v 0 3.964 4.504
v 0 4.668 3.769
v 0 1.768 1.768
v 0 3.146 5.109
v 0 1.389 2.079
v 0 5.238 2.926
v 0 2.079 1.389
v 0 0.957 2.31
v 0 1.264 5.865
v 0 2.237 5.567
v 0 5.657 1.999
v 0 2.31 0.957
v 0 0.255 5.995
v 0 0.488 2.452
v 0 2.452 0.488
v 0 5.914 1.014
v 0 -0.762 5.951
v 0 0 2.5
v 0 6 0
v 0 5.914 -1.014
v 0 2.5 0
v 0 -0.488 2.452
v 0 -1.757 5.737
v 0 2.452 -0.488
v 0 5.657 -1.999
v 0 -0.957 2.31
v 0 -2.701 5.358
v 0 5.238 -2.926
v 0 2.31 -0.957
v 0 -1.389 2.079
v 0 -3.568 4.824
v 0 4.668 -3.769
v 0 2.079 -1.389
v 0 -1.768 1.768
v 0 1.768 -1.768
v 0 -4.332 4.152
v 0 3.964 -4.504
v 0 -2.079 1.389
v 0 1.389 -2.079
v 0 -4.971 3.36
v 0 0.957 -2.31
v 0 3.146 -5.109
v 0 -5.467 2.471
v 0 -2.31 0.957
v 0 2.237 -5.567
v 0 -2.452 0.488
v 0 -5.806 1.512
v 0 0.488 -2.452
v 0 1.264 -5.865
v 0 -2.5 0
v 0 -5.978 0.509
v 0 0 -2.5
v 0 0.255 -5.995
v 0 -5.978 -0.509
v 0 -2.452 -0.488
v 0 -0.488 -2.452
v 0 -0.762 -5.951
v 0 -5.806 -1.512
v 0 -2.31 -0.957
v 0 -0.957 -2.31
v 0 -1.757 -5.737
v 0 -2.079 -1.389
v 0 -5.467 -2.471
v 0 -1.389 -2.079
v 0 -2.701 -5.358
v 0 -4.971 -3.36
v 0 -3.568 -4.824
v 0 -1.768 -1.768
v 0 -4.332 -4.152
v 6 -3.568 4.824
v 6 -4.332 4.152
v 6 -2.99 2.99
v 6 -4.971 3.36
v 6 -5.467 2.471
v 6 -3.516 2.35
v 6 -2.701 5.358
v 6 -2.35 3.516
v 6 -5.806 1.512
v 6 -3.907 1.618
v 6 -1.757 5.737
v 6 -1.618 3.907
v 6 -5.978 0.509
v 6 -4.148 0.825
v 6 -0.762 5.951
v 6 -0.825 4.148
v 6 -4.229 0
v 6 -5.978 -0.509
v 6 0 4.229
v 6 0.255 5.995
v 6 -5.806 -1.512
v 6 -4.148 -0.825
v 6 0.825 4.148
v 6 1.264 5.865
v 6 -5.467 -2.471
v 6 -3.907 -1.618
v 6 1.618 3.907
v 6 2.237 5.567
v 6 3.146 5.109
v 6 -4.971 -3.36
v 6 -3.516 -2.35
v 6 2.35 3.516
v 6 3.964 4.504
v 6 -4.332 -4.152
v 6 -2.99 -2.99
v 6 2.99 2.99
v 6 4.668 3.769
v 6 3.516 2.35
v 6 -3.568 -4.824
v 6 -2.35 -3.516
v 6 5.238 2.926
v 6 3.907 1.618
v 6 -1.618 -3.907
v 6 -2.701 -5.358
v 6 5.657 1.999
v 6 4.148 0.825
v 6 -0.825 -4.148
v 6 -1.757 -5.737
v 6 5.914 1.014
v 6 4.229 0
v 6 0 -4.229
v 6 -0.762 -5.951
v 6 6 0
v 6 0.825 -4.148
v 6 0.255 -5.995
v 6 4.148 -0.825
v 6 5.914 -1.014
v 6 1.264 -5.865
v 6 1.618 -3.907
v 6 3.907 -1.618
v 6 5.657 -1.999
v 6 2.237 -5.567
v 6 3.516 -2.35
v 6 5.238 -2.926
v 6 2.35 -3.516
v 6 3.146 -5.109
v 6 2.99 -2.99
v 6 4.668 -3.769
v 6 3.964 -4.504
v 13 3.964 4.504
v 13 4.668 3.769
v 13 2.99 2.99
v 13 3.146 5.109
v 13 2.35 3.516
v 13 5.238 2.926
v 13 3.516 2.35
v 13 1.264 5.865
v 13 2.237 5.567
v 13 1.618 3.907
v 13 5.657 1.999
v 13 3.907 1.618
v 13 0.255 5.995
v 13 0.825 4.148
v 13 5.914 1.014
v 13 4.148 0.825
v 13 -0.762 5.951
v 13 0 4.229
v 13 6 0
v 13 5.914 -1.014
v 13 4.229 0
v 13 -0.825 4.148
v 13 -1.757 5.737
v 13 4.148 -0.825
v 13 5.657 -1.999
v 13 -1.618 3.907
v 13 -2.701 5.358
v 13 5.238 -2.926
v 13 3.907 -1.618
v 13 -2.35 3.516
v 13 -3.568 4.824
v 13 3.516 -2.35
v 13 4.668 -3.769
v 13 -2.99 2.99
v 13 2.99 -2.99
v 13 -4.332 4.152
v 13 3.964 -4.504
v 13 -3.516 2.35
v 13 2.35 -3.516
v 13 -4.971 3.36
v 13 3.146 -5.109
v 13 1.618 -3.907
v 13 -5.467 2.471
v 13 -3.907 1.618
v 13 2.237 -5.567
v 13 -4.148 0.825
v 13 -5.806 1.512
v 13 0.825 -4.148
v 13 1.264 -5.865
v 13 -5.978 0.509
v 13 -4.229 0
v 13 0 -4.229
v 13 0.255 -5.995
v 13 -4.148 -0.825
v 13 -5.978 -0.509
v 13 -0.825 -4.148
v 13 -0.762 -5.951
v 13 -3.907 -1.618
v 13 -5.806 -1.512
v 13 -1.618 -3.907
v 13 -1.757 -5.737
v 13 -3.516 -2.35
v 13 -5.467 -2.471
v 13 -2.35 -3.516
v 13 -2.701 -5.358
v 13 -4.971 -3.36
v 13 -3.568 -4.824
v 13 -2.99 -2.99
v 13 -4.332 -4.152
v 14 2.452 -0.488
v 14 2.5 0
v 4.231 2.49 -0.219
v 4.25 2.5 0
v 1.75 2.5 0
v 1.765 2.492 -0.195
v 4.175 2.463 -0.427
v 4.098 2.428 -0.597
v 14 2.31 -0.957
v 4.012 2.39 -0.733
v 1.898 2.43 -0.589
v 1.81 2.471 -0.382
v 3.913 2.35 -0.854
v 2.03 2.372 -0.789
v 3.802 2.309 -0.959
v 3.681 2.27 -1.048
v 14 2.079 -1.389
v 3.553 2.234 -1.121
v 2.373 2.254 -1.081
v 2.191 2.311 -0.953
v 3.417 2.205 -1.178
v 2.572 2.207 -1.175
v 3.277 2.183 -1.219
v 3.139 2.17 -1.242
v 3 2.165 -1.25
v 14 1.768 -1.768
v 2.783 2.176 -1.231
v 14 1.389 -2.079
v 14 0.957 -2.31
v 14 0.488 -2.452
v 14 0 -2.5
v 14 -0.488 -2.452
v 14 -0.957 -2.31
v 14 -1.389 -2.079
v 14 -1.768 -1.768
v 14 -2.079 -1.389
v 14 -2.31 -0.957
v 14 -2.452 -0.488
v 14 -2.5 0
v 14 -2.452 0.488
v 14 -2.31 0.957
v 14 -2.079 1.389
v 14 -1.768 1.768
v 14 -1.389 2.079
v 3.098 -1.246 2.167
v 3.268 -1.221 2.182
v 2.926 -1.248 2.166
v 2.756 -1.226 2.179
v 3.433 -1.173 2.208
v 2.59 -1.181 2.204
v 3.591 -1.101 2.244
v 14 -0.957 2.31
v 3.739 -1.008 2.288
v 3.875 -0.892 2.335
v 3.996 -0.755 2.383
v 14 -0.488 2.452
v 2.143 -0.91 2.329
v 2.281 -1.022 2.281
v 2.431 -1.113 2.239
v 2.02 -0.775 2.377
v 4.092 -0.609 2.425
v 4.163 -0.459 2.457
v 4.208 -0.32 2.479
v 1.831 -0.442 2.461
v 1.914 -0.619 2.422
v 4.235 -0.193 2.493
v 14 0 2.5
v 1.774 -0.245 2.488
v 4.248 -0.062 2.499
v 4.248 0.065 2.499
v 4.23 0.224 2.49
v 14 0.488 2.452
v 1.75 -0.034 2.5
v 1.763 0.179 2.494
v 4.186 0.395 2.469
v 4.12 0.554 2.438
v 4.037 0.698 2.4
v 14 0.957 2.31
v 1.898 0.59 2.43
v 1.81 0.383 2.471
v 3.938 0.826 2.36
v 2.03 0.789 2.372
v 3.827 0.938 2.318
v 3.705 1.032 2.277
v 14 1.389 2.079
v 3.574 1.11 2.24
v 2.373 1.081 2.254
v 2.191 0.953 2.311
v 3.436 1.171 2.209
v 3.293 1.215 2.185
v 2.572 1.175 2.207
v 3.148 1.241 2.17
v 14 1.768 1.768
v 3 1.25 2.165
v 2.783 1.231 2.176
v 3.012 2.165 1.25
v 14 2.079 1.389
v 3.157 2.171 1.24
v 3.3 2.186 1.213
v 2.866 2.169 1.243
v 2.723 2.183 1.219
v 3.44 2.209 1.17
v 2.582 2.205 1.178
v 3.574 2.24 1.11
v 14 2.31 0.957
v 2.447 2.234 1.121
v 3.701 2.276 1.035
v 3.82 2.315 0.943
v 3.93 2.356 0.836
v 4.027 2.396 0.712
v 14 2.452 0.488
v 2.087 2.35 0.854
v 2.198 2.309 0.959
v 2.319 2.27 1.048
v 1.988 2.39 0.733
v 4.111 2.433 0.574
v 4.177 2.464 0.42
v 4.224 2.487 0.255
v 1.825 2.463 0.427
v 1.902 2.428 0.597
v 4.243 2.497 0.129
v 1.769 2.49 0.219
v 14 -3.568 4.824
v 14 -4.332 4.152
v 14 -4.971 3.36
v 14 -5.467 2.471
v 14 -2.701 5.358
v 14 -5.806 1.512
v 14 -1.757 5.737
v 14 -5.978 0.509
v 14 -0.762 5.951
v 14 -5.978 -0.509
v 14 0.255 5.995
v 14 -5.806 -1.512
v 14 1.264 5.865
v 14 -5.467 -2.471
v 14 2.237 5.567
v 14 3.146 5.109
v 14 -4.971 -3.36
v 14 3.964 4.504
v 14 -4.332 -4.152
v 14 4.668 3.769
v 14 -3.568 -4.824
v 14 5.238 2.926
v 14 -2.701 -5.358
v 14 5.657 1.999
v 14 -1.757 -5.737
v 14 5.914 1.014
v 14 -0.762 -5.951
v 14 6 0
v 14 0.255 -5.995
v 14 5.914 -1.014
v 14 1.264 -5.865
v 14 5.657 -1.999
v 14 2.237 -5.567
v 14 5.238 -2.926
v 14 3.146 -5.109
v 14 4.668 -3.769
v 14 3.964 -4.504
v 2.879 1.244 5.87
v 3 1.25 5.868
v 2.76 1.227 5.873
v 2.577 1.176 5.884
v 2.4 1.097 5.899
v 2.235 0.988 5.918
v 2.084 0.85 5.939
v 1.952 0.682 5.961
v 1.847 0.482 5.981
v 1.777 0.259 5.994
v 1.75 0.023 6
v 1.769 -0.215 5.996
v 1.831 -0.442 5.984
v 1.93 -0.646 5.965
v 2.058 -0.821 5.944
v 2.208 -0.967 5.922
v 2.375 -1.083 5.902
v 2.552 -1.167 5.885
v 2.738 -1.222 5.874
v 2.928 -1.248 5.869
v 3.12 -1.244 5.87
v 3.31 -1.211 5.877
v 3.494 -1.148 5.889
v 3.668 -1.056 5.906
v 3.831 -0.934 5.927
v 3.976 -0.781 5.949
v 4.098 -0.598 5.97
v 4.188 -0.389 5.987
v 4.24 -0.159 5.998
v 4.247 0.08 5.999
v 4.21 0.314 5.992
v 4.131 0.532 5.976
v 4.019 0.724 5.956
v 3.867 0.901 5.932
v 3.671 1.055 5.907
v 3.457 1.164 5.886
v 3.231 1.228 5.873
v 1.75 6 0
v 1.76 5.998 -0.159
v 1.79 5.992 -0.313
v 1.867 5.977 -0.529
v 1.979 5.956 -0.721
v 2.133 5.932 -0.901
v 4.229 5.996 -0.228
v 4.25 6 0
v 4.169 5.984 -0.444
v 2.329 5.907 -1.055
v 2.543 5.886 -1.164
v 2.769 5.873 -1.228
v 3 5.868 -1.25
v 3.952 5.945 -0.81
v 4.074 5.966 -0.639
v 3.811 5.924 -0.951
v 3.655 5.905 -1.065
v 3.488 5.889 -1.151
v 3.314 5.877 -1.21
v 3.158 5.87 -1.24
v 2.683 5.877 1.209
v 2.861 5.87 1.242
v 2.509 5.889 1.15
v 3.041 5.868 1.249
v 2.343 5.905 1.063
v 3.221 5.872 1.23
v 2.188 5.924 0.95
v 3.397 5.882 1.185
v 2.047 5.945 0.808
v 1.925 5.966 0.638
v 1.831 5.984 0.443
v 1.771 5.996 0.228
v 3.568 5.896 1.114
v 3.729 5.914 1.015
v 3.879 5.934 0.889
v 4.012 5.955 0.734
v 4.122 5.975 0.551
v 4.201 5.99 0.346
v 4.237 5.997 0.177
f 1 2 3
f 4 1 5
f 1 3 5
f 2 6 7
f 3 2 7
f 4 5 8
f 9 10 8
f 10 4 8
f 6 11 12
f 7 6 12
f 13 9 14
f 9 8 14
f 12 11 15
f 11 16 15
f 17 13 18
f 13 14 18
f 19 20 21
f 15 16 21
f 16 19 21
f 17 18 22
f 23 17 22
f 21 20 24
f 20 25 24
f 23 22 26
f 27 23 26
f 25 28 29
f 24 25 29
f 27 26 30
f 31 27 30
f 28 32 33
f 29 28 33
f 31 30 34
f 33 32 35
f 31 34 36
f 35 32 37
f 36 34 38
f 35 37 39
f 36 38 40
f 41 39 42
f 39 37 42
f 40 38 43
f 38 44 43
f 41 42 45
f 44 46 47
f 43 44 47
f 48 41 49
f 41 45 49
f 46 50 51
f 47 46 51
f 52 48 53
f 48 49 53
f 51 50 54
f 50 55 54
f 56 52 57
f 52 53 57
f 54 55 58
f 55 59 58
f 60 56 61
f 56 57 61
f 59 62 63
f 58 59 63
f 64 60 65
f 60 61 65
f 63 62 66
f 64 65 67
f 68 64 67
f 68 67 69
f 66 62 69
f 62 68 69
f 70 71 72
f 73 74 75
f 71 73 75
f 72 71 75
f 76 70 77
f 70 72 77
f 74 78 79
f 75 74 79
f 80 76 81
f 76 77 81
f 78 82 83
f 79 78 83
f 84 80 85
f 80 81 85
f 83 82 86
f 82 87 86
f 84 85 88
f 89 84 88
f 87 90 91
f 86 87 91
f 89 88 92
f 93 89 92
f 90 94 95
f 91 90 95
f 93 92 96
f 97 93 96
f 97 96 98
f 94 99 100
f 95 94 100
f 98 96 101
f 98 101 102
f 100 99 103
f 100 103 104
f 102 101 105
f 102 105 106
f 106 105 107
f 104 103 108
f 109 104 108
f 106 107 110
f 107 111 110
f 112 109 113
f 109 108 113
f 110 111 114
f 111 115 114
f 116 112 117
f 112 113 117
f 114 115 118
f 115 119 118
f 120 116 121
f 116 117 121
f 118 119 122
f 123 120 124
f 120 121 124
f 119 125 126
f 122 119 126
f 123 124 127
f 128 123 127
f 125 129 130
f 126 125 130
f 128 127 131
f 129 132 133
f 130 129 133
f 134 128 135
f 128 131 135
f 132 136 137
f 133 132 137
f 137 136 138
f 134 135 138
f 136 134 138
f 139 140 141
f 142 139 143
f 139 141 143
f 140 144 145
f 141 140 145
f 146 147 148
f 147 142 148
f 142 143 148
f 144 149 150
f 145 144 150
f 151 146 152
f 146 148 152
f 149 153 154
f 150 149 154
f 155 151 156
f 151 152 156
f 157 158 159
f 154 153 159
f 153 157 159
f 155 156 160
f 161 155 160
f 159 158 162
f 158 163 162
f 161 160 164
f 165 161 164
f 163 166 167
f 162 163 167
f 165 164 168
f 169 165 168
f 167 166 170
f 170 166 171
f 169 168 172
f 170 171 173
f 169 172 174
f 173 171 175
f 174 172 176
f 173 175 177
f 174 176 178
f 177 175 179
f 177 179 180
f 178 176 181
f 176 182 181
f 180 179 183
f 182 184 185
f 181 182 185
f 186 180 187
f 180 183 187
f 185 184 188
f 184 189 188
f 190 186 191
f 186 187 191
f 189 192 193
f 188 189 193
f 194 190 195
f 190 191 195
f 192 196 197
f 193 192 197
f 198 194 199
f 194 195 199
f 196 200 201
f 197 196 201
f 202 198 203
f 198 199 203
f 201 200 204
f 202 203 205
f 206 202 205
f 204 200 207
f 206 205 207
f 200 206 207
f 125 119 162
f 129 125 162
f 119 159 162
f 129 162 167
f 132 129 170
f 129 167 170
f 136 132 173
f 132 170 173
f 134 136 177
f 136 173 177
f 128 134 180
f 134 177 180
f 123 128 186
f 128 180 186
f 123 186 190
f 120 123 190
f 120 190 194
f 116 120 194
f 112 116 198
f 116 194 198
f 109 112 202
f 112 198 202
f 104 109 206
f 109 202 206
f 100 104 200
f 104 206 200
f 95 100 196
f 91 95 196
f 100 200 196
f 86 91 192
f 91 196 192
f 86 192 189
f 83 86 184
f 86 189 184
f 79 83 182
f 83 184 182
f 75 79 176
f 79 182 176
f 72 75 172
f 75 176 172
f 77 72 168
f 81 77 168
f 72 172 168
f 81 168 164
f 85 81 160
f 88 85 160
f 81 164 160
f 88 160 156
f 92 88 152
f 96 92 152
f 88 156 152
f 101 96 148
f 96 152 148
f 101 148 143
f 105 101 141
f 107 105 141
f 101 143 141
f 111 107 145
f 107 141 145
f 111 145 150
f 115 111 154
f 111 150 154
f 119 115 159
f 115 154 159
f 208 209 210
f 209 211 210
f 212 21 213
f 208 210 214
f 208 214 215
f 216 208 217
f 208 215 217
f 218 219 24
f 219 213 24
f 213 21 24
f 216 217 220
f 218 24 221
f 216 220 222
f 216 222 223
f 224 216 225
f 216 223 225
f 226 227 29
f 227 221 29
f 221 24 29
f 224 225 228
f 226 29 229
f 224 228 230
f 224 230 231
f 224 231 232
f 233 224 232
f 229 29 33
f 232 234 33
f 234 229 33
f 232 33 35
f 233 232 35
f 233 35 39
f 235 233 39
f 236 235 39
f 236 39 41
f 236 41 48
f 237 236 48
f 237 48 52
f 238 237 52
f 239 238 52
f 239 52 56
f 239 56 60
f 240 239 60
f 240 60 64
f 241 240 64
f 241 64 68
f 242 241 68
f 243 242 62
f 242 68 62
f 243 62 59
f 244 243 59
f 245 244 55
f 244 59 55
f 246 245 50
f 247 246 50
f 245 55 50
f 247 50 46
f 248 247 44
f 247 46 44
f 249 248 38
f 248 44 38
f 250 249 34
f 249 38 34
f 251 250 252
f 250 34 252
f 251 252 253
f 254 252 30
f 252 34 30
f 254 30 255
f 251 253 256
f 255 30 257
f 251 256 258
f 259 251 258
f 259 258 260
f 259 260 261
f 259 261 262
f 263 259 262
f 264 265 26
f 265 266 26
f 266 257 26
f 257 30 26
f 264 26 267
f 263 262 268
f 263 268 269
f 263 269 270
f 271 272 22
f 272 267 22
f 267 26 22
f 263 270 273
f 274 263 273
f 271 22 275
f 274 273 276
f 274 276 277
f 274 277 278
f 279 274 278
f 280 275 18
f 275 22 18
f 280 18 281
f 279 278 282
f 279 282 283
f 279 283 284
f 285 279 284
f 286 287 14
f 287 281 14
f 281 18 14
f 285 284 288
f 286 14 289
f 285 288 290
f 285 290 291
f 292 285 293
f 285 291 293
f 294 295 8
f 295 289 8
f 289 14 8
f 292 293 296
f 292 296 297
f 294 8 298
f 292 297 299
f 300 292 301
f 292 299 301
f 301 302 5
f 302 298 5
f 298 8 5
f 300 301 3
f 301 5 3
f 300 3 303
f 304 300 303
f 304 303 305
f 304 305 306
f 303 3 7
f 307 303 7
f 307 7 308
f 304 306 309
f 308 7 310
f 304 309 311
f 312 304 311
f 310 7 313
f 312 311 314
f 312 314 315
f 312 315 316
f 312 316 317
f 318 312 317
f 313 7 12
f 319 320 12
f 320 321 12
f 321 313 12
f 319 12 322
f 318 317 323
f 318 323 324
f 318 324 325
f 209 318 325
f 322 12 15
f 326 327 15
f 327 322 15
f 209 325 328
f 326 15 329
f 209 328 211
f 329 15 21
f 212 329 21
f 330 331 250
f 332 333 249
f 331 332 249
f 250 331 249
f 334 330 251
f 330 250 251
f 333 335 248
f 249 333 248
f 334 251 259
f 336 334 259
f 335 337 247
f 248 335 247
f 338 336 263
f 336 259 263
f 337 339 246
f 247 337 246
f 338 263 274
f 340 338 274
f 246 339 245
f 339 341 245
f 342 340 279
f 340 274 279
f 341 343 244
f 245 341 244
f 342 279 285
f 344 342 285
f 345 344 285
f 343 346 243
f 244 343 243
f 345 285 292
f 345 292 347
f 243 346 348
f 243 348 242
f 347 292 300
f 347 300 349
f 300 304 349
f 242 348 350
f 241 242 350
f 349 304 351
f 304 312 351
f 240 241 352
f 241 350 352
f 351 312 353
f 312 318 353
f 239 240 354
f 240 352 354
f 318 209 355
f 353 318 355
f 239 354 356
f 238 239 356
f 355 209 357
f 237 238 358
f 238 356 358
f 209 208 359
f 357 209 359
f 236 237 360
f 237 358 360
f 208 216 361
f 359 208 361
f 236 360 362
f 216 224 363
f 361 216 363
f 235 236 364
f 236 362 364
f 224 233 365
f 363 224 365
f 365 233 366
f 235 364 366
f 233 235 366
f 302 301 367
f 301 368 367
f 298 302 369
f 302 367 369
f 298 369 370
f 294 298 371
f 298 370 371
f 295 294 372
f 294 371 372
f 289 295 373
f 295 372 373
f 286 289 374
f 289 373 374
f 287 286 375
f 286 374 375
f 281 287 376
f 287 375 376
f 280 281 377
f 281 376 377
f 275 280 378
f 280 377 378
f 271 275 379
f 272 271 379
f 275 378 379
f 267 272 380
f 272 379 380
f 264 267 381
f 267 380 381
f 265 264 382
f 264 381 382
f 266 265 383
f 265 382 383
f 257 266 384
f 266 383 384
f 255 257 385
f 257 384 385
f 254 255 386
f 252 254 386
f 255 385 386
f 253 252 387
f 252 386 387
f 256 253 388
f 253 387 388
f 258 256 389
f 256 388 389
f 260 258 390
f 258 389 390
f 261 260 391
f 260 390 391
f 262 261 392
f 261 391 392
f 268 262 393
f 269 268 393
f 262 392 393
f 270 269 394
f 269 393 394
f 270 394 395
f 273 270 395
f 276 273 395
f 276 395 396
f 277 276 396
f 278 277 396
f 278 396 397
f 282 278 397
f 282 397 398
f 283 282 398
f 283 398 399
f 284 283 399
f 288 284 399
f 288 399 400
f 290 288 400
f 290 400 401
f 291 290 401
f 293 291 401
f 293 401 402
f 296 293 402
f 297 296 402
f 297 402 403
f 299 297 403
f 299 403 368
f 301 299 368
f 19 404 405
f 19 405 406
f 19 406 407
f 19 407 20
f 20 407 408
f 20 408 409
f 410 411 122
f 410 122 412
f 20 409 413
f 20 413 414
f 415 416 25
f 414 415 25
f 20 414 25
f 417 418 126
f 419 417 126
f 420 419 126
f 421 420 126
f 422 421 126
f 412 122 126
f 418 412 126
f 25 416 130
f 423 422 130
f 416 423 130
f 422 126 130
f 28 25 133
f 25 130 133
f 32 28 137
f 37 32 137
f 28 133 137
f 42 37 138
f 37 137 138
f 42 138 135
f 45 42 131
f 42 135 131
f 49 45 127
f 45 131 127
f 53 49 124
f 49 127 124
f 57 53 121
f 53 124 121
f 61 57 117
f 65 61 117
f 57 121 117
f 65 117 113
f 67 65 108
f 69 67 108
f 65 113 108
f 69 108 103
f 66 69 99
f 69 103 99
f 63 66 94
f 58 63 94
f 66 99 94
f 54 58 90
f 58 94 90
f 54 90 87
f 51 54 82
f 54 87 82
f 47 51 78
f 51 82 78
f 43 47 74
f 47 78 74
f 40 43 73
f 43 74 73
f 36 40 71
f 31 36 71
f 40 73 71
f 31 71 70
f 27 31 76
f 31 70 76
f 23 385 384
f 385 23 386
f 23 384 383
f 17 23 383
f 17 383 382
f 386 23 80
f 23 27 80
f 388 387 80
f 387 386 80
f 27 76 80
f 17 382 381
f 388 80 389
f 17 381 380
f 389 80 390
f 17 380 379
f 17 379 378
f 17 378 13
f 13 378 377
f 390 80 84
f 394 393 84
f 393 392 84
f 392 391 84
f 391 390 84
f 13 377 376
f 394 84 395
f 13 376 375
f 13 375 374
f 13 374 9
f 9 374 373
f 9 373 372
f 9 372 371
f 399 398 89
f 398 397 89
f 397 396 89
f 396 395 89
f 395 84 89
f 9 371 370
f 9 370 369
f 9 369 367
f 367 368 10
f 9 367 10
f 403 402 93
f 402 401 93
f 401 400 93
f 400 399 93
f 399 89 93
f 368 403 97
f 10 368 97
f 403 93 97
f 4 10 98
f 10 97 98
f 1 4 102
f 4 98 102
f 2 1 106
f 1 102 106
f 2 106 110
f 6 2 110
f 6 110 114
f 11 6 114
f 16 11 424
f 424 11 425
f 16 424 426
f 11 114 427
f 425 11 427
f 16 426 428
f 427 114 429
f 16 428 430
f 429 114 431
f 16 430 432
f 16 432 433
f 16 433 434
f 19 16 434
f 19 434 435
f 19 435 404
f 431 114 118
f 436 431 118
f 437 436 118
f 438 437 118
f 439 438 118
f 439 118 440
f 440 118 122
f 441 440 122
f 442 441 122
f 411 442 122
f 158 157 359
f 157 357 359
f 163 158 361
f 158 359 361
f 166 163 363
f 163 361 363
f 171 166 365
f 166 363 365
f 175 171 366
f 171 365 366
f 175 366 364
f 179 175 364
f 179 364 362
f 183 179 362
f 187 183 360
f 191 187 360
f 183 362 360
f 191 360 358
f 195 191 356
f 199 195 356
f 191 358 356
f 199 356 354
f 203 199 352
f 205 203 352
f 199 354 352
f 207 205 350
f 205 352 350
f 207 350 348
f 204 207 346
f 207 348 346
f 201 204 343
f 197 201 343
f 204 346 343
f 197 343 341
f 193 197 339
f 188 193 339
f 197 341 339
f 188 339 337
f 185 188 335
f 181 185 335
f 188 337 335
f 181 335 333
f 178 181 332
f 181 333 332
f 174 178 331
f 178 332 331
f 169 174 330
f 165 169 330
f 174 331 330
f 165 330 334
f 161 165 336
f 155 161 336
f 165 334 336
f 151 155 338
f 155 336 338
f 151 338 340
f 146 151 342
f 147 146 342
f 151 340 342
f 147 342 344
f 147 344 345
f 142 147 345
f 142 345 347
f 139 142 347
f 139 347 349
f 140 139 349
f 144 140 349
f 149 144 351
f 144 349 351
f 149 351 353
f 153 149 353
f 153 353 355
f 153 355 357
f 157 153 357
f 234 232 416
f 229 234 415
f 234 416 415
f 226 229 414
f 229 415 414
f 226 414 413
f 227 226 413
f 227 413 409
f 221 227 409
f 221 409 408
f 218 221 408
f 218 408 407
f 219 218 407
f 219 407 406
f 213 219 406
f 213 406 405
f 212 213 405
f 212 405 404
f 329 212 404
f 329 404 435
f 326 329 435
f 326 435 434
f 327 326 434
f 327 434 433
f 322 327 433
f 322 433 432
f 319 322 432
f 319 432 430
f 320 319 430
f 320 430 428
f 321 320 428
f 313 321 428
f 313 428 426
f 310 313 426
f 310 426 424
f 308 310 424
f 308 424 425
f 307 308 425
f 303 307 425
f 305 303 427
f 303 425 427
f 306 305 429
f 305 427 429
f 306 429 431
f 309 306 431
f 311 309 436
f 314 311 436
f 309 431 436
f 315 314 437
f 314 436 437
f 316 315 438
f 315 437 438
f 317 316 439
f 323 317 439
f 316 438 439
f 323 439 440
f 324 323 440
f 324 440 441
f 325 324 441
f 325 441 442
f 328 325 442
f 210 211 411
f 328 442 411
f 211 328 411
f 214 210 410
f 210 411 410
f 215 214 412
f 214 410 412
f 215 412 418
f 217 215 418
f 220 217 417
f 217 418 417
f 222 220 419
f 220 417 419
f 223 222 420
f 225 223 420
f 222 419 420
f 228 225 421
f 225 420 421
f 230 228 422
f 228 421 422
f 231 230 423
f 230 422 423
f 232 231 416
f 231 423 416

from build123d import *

# Parameters (mm, degrees)
SKETCH2_W = 1.25
SKETCH2_H = 6
SKETCH4_W = 1.25
SKETCH4_H = 6


with BuildPart() as part:
    # Sketch1 → Revolve1 (revolve)
    with BuildSketch(Plane.XY):
        Polygon((0, 2.5), (0, 6), (6, 6), (6, 4.2291), (13, 4.2291), (13, 6), (14, 6), (14, 2.5), align=None)
    revolve(axis=Axis((0, 0, 0), (-1, 0, 0)))

    # Sketch2 → M3x0.5 Tapped Hole1 (revolve, cut)
    with BuildSketch(Plane(origin=(3, 0, 0), x_dir=(0, 0, -1), z_dir=(1, 0, 0))):
        with Locations((0.625, 3)):
            Rectangle(SKETCH2_W, SKETCH2_H)
    revolve(axis=Axis((3, -6.35, 0), (0, 1, 0)), mode=Mode.SUBTRACT)

    # Sketch4 → M3x0.5 Tapped Hole2 (revolve, cut)
    with BuildSketch(Plane.YZ.offset(3)):
        with Locations((0.625, 3)):
            Rectangle(SKETCH4_W, SKETCH4_H)
    revolve(axis=Axis((3, 0, -6.35), (0, 0, 1)), mode=Mode.SUBTRACT)


solid = part.part
